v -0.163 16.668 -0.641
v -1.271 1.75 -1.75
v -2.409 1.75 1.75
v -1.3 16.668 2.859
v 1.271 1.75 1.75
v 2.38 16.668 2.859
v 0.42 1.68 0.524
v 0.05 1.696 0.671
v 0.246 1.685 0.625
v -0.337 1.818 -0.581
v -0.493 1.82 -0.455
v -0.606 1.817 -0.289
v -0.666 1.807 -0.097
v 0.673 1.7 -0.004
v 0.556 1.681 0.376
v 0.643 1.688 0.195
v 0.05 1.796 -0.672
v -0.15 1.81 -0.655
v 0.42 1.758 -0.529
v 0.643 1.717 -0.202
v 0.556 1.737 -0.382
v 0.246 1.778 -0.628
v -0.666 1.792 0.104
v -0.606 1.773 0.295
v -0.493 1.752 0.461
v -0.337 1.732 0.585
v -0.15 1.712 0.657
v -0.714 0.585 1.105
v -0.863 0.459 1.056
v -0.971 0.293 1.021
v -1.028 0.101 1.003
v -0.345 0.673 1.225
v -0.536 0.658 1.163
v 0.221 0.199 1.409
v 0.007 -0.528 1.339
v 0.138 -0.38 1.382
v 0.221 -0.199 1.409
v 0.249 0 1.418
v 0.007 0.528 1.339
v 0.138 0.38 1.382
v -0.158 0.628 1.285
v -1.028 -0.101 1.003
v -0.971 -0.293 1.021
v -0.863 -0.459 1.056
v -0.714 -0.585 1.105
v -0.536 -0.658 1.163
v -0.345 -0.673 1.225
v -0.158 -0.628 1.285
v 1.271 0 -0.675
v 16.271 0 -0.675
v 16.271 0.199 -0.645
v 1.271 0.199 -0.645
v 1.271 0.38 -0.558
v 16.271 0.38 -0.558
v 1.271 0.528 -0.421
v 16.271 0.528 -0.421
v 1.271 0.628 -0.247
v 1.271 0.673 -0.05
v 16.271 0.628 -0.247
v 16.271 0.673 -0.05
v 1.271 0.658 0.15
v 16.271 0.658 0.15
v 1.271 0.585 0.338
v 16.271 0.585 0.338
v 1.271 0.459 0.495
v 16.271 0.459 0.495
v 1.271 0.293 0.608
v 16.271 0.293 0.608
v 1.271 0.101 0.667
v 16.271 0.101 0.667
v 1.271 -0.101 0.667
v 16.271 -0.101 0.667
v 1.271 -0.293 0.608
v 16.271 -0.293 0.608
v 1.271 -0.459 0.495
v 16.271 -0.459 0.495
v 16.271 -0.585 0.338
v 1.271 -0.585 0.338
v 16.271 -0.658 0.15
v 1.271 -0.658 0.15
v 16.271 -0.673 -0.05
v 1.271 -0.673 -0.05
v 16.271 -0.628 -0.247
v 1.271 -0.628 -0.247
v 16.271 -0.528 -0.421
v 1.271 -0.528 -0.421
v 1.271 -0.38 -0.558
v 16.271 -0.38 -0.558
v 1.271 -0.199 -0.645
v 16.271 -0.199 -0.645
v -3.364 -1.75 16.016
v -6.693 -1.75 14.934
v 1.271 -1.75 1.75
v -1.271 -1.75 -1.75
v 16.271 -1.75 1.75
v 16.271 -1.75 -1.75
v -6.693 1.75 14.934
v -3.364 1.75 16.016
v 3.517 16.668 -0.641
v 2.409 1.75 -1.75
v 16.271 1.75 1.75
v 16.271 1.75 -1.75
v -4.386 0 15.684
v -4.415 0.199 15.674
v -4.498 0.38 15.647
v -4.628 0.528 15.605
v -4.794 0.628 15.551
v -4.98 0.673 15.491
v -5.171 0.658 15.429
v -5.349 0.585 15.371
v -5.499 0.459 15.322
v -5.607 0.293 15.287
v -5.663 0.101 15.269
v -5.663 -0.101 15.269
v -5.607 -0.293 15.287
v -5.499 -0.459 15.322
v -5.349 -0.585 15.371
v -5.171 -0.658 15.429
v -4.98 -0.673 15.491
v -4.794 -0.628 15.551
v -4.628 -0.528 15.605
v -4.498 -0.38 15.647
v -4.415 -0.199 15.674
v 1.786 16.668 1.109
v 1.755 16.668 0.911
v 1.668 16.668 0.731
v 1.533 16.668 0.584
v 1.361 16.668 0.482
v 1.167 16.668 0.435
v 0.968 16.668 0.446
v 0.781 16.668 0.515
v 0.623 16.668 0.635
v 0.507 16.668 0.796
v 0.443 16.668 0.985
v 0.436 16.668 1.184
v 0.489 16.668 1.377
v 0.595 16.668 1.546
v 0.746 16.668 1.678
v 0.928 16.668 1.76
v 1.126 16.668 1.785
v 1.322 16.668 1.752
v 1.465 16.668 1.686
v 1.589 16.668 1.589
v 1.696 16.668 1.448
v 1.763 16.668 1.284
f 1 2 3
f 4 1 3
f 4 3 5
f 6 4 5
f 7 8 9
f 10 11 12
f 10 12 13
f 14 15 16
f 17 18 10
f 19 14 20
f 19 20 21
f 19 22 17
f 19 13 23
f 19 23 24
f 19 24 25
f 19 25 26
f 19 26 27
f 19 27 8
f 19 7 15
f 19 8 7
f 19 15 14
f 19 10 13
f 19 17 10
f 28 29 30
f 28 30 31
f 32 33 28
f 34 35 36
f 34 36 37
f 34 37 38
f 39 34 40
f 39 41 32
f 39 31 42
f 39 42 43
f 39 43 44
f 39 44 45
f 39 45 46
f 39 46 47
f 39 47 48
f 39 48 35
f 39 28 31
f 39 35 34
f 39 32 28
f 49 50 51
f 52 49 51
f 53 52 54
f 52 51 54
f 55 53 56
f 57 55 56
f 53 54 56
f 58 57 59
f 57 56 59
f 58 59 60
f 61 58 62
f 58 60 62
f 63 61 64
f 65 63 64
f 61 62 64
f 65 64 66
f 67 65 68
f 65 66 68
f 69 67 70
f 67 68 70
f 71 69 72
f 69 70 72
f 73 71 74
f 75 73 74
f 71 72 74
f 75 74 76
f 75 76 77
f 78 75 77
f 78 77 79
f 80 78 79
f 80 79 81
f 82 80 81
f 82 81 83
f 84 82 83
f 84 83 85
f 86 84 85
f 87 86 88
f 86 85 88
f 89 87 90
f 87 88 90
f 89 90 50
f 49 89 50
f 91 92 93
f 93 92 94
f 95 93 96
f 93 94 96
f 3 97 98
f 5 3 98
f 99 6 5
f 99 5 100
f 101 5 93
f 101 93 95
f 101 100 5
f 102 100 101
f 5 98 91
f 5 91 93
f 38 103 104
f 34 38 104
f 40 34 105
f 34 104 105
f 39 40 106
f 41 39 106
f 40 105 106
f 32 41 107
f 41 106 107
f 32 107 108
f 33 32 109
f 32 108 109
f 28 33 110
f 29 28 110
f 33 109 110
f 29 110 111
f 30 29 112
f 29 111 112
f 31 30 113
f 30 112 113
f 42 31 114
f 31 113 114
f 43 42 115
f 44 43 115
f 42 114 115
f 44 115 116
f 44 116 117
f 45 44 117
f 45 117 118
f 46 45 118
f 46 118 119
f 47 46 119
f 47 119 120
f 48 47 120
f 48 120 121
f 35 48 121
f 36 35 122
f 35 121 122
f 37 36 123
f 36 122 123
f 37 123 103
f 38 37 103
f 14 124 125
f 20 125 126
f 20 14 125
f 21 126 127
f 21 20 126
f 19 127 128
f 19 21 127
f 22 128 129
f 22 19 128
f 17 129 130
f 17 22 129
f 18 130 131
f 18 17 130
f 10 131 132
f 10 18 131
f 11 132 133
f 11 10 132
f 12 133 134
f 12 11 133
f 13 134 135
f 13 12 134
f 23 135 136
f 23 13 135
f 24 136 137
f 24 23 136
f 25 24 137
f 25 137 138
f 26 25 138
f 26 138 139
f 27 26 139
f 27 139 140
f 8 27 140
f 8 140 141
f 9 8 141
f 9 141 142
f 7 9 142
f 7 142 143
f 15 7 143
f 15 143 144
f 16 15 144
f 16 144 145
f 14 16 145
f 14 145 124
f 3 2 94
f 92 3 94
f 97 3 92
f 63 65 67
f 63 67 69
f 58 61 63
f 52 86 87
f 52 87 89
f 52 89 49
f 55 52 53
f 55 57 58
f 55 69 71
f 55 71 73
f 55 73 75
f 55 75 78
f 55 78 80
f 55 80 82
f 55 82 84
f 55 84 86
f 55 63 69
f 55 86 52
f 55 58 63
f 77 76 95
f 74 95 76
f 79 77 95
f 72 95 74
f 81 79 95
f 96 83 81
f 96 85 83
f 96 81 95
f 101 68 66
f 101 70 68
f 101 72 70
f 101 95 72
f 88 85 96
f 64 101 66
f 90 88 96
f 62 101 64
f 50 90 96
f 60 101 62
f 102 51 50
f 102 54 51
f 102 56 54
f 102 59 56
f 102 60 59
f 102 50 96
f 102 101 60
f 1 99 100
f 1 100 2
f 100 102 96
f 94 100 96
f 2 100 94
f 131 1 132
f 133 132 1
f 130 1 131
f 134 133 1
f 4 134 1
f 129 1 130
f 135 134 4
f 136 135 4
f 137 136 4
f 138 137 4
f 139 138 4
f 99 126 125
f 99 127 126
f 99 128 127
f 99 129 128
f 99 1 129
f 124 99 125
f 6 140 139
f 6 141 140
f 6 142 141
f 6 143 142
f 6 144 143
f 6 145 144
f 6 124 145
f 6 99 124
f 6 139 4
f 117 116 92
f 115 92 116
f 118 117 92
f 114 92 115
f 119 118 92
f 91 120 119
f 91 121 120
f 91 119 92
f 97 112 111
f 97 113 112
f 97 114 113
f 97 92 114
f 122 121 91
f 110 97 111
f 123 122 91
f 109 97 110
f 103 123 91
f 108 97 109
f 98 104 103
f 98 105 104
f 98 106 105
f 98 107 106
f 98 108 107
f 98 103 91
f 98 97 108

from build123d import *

# Parameters (mm, degrees)
BOSS_EXTRUDE1_DEPTH  = 1.75
SKETCH3_R            = 0.675
CUT_EXTRUDE1_DEPTH   = 15
SKETCH4_R            = 0.675
CUT_EXTRUDE2_DEPTH   = 15
CUT_SWEEP1_START     = 1.740413317
CUT_SWEEP1_OUTLINE_R = 0.675
CUT_SWEEP1_DEPTH     = 15.070945459


# Read off the part's stored shape, not the designer's step: Cut-Sweep1
with BuildPart() as part:
    # Sketch2 → Boss-Extrude1 (new, symmetric)
    with BuildSketch(Plane(origin=(0, 0, 0), x_dir=(1, 0, 0), z_dir=(0, 1, 0))):
        Polygon((-1.271449424, 1.75), (-6.692503299, -14.934288264), (-3.363805492, -16.015847744), (1.271449424, -1.75), (16.271449424, -1.75), (16.271449424, 1.75), align=None)
    extrude(amount=BOSS_EXTRUDE1_DEPTH, both=True)

    # Sketch3 → Cut-Extrude1 (cut)
    with BuildSketch(Plane(origin=(-5.028154395, 0, 15.475068004), x_dir=(0.9510565162951536, 0, 0.3090169943749472), z_dir=(-0.3090169943749472, 0, 0.9510565162951536))):
        Circle(SKETCH3_R)
    extrude(amount=-CUT_EXTRUDE1_DEPTH, mode=Mode.SUBTRACT)

    # Sketch4 → Cut-Extrude2 (cut)
    with BuildSketch(Plane(origin=(16.271449424, 0, 0), x_dir=(0, 0, -1), z_dir=(1, 0, 0))):
        Circle(SKETCH4_R)
    extrude(amount=-CUT_EXTRUDE2_DEPTH, mode=Mode.SUBTRACT)

    # Sweep1: sweep along a path in Sketch7
    with BuildLine(Plane(origin=(0, 0, 0), x_dir=(0.7071067811865477, 0, 0.7071067811865475), z_dir=(-0.7071067811865475, 0, 0.7071067811865477))) as sweep1_path:
        Line((0, 1.75), (1.567926949, 16.667828431))
    # Sketch5 → Sweep1 (sweep)
    with BuildSketch(Plane(origin=(0, 1.75, 0), x_dir=(1, 0, 0), z_dir=(0, 1, 0))):
        Polygon((1.271449424, -1.75), (-2.408668361, -1.75), (-1.271449424, 1.75), (2.408668361, 1.75), align=None)
    sweep(path=sweep1_path.line)

    # Cut-Sweep1 outline → Cut-Sweep1 (cut)
    with BuildSketch(Plane(origin=(0, 0, 0), x_dir=(0.9972647091838012, -0.07370950015142784, -0.0054780839693199055), z_dir=(0.07391278520356448, 0.9945218953682737, 0.07391278520356448)).offset(CUT_SWEEP1_START)):
        with Locations((-0.128991625, 0.129702147)):
            Circle(CUT_SWEEP1_OUTLINE_R)
    extrude(amount=CUT_SWEEP1_DEPTH, mode=Mode.SUBTRACT)


solid = part.part
